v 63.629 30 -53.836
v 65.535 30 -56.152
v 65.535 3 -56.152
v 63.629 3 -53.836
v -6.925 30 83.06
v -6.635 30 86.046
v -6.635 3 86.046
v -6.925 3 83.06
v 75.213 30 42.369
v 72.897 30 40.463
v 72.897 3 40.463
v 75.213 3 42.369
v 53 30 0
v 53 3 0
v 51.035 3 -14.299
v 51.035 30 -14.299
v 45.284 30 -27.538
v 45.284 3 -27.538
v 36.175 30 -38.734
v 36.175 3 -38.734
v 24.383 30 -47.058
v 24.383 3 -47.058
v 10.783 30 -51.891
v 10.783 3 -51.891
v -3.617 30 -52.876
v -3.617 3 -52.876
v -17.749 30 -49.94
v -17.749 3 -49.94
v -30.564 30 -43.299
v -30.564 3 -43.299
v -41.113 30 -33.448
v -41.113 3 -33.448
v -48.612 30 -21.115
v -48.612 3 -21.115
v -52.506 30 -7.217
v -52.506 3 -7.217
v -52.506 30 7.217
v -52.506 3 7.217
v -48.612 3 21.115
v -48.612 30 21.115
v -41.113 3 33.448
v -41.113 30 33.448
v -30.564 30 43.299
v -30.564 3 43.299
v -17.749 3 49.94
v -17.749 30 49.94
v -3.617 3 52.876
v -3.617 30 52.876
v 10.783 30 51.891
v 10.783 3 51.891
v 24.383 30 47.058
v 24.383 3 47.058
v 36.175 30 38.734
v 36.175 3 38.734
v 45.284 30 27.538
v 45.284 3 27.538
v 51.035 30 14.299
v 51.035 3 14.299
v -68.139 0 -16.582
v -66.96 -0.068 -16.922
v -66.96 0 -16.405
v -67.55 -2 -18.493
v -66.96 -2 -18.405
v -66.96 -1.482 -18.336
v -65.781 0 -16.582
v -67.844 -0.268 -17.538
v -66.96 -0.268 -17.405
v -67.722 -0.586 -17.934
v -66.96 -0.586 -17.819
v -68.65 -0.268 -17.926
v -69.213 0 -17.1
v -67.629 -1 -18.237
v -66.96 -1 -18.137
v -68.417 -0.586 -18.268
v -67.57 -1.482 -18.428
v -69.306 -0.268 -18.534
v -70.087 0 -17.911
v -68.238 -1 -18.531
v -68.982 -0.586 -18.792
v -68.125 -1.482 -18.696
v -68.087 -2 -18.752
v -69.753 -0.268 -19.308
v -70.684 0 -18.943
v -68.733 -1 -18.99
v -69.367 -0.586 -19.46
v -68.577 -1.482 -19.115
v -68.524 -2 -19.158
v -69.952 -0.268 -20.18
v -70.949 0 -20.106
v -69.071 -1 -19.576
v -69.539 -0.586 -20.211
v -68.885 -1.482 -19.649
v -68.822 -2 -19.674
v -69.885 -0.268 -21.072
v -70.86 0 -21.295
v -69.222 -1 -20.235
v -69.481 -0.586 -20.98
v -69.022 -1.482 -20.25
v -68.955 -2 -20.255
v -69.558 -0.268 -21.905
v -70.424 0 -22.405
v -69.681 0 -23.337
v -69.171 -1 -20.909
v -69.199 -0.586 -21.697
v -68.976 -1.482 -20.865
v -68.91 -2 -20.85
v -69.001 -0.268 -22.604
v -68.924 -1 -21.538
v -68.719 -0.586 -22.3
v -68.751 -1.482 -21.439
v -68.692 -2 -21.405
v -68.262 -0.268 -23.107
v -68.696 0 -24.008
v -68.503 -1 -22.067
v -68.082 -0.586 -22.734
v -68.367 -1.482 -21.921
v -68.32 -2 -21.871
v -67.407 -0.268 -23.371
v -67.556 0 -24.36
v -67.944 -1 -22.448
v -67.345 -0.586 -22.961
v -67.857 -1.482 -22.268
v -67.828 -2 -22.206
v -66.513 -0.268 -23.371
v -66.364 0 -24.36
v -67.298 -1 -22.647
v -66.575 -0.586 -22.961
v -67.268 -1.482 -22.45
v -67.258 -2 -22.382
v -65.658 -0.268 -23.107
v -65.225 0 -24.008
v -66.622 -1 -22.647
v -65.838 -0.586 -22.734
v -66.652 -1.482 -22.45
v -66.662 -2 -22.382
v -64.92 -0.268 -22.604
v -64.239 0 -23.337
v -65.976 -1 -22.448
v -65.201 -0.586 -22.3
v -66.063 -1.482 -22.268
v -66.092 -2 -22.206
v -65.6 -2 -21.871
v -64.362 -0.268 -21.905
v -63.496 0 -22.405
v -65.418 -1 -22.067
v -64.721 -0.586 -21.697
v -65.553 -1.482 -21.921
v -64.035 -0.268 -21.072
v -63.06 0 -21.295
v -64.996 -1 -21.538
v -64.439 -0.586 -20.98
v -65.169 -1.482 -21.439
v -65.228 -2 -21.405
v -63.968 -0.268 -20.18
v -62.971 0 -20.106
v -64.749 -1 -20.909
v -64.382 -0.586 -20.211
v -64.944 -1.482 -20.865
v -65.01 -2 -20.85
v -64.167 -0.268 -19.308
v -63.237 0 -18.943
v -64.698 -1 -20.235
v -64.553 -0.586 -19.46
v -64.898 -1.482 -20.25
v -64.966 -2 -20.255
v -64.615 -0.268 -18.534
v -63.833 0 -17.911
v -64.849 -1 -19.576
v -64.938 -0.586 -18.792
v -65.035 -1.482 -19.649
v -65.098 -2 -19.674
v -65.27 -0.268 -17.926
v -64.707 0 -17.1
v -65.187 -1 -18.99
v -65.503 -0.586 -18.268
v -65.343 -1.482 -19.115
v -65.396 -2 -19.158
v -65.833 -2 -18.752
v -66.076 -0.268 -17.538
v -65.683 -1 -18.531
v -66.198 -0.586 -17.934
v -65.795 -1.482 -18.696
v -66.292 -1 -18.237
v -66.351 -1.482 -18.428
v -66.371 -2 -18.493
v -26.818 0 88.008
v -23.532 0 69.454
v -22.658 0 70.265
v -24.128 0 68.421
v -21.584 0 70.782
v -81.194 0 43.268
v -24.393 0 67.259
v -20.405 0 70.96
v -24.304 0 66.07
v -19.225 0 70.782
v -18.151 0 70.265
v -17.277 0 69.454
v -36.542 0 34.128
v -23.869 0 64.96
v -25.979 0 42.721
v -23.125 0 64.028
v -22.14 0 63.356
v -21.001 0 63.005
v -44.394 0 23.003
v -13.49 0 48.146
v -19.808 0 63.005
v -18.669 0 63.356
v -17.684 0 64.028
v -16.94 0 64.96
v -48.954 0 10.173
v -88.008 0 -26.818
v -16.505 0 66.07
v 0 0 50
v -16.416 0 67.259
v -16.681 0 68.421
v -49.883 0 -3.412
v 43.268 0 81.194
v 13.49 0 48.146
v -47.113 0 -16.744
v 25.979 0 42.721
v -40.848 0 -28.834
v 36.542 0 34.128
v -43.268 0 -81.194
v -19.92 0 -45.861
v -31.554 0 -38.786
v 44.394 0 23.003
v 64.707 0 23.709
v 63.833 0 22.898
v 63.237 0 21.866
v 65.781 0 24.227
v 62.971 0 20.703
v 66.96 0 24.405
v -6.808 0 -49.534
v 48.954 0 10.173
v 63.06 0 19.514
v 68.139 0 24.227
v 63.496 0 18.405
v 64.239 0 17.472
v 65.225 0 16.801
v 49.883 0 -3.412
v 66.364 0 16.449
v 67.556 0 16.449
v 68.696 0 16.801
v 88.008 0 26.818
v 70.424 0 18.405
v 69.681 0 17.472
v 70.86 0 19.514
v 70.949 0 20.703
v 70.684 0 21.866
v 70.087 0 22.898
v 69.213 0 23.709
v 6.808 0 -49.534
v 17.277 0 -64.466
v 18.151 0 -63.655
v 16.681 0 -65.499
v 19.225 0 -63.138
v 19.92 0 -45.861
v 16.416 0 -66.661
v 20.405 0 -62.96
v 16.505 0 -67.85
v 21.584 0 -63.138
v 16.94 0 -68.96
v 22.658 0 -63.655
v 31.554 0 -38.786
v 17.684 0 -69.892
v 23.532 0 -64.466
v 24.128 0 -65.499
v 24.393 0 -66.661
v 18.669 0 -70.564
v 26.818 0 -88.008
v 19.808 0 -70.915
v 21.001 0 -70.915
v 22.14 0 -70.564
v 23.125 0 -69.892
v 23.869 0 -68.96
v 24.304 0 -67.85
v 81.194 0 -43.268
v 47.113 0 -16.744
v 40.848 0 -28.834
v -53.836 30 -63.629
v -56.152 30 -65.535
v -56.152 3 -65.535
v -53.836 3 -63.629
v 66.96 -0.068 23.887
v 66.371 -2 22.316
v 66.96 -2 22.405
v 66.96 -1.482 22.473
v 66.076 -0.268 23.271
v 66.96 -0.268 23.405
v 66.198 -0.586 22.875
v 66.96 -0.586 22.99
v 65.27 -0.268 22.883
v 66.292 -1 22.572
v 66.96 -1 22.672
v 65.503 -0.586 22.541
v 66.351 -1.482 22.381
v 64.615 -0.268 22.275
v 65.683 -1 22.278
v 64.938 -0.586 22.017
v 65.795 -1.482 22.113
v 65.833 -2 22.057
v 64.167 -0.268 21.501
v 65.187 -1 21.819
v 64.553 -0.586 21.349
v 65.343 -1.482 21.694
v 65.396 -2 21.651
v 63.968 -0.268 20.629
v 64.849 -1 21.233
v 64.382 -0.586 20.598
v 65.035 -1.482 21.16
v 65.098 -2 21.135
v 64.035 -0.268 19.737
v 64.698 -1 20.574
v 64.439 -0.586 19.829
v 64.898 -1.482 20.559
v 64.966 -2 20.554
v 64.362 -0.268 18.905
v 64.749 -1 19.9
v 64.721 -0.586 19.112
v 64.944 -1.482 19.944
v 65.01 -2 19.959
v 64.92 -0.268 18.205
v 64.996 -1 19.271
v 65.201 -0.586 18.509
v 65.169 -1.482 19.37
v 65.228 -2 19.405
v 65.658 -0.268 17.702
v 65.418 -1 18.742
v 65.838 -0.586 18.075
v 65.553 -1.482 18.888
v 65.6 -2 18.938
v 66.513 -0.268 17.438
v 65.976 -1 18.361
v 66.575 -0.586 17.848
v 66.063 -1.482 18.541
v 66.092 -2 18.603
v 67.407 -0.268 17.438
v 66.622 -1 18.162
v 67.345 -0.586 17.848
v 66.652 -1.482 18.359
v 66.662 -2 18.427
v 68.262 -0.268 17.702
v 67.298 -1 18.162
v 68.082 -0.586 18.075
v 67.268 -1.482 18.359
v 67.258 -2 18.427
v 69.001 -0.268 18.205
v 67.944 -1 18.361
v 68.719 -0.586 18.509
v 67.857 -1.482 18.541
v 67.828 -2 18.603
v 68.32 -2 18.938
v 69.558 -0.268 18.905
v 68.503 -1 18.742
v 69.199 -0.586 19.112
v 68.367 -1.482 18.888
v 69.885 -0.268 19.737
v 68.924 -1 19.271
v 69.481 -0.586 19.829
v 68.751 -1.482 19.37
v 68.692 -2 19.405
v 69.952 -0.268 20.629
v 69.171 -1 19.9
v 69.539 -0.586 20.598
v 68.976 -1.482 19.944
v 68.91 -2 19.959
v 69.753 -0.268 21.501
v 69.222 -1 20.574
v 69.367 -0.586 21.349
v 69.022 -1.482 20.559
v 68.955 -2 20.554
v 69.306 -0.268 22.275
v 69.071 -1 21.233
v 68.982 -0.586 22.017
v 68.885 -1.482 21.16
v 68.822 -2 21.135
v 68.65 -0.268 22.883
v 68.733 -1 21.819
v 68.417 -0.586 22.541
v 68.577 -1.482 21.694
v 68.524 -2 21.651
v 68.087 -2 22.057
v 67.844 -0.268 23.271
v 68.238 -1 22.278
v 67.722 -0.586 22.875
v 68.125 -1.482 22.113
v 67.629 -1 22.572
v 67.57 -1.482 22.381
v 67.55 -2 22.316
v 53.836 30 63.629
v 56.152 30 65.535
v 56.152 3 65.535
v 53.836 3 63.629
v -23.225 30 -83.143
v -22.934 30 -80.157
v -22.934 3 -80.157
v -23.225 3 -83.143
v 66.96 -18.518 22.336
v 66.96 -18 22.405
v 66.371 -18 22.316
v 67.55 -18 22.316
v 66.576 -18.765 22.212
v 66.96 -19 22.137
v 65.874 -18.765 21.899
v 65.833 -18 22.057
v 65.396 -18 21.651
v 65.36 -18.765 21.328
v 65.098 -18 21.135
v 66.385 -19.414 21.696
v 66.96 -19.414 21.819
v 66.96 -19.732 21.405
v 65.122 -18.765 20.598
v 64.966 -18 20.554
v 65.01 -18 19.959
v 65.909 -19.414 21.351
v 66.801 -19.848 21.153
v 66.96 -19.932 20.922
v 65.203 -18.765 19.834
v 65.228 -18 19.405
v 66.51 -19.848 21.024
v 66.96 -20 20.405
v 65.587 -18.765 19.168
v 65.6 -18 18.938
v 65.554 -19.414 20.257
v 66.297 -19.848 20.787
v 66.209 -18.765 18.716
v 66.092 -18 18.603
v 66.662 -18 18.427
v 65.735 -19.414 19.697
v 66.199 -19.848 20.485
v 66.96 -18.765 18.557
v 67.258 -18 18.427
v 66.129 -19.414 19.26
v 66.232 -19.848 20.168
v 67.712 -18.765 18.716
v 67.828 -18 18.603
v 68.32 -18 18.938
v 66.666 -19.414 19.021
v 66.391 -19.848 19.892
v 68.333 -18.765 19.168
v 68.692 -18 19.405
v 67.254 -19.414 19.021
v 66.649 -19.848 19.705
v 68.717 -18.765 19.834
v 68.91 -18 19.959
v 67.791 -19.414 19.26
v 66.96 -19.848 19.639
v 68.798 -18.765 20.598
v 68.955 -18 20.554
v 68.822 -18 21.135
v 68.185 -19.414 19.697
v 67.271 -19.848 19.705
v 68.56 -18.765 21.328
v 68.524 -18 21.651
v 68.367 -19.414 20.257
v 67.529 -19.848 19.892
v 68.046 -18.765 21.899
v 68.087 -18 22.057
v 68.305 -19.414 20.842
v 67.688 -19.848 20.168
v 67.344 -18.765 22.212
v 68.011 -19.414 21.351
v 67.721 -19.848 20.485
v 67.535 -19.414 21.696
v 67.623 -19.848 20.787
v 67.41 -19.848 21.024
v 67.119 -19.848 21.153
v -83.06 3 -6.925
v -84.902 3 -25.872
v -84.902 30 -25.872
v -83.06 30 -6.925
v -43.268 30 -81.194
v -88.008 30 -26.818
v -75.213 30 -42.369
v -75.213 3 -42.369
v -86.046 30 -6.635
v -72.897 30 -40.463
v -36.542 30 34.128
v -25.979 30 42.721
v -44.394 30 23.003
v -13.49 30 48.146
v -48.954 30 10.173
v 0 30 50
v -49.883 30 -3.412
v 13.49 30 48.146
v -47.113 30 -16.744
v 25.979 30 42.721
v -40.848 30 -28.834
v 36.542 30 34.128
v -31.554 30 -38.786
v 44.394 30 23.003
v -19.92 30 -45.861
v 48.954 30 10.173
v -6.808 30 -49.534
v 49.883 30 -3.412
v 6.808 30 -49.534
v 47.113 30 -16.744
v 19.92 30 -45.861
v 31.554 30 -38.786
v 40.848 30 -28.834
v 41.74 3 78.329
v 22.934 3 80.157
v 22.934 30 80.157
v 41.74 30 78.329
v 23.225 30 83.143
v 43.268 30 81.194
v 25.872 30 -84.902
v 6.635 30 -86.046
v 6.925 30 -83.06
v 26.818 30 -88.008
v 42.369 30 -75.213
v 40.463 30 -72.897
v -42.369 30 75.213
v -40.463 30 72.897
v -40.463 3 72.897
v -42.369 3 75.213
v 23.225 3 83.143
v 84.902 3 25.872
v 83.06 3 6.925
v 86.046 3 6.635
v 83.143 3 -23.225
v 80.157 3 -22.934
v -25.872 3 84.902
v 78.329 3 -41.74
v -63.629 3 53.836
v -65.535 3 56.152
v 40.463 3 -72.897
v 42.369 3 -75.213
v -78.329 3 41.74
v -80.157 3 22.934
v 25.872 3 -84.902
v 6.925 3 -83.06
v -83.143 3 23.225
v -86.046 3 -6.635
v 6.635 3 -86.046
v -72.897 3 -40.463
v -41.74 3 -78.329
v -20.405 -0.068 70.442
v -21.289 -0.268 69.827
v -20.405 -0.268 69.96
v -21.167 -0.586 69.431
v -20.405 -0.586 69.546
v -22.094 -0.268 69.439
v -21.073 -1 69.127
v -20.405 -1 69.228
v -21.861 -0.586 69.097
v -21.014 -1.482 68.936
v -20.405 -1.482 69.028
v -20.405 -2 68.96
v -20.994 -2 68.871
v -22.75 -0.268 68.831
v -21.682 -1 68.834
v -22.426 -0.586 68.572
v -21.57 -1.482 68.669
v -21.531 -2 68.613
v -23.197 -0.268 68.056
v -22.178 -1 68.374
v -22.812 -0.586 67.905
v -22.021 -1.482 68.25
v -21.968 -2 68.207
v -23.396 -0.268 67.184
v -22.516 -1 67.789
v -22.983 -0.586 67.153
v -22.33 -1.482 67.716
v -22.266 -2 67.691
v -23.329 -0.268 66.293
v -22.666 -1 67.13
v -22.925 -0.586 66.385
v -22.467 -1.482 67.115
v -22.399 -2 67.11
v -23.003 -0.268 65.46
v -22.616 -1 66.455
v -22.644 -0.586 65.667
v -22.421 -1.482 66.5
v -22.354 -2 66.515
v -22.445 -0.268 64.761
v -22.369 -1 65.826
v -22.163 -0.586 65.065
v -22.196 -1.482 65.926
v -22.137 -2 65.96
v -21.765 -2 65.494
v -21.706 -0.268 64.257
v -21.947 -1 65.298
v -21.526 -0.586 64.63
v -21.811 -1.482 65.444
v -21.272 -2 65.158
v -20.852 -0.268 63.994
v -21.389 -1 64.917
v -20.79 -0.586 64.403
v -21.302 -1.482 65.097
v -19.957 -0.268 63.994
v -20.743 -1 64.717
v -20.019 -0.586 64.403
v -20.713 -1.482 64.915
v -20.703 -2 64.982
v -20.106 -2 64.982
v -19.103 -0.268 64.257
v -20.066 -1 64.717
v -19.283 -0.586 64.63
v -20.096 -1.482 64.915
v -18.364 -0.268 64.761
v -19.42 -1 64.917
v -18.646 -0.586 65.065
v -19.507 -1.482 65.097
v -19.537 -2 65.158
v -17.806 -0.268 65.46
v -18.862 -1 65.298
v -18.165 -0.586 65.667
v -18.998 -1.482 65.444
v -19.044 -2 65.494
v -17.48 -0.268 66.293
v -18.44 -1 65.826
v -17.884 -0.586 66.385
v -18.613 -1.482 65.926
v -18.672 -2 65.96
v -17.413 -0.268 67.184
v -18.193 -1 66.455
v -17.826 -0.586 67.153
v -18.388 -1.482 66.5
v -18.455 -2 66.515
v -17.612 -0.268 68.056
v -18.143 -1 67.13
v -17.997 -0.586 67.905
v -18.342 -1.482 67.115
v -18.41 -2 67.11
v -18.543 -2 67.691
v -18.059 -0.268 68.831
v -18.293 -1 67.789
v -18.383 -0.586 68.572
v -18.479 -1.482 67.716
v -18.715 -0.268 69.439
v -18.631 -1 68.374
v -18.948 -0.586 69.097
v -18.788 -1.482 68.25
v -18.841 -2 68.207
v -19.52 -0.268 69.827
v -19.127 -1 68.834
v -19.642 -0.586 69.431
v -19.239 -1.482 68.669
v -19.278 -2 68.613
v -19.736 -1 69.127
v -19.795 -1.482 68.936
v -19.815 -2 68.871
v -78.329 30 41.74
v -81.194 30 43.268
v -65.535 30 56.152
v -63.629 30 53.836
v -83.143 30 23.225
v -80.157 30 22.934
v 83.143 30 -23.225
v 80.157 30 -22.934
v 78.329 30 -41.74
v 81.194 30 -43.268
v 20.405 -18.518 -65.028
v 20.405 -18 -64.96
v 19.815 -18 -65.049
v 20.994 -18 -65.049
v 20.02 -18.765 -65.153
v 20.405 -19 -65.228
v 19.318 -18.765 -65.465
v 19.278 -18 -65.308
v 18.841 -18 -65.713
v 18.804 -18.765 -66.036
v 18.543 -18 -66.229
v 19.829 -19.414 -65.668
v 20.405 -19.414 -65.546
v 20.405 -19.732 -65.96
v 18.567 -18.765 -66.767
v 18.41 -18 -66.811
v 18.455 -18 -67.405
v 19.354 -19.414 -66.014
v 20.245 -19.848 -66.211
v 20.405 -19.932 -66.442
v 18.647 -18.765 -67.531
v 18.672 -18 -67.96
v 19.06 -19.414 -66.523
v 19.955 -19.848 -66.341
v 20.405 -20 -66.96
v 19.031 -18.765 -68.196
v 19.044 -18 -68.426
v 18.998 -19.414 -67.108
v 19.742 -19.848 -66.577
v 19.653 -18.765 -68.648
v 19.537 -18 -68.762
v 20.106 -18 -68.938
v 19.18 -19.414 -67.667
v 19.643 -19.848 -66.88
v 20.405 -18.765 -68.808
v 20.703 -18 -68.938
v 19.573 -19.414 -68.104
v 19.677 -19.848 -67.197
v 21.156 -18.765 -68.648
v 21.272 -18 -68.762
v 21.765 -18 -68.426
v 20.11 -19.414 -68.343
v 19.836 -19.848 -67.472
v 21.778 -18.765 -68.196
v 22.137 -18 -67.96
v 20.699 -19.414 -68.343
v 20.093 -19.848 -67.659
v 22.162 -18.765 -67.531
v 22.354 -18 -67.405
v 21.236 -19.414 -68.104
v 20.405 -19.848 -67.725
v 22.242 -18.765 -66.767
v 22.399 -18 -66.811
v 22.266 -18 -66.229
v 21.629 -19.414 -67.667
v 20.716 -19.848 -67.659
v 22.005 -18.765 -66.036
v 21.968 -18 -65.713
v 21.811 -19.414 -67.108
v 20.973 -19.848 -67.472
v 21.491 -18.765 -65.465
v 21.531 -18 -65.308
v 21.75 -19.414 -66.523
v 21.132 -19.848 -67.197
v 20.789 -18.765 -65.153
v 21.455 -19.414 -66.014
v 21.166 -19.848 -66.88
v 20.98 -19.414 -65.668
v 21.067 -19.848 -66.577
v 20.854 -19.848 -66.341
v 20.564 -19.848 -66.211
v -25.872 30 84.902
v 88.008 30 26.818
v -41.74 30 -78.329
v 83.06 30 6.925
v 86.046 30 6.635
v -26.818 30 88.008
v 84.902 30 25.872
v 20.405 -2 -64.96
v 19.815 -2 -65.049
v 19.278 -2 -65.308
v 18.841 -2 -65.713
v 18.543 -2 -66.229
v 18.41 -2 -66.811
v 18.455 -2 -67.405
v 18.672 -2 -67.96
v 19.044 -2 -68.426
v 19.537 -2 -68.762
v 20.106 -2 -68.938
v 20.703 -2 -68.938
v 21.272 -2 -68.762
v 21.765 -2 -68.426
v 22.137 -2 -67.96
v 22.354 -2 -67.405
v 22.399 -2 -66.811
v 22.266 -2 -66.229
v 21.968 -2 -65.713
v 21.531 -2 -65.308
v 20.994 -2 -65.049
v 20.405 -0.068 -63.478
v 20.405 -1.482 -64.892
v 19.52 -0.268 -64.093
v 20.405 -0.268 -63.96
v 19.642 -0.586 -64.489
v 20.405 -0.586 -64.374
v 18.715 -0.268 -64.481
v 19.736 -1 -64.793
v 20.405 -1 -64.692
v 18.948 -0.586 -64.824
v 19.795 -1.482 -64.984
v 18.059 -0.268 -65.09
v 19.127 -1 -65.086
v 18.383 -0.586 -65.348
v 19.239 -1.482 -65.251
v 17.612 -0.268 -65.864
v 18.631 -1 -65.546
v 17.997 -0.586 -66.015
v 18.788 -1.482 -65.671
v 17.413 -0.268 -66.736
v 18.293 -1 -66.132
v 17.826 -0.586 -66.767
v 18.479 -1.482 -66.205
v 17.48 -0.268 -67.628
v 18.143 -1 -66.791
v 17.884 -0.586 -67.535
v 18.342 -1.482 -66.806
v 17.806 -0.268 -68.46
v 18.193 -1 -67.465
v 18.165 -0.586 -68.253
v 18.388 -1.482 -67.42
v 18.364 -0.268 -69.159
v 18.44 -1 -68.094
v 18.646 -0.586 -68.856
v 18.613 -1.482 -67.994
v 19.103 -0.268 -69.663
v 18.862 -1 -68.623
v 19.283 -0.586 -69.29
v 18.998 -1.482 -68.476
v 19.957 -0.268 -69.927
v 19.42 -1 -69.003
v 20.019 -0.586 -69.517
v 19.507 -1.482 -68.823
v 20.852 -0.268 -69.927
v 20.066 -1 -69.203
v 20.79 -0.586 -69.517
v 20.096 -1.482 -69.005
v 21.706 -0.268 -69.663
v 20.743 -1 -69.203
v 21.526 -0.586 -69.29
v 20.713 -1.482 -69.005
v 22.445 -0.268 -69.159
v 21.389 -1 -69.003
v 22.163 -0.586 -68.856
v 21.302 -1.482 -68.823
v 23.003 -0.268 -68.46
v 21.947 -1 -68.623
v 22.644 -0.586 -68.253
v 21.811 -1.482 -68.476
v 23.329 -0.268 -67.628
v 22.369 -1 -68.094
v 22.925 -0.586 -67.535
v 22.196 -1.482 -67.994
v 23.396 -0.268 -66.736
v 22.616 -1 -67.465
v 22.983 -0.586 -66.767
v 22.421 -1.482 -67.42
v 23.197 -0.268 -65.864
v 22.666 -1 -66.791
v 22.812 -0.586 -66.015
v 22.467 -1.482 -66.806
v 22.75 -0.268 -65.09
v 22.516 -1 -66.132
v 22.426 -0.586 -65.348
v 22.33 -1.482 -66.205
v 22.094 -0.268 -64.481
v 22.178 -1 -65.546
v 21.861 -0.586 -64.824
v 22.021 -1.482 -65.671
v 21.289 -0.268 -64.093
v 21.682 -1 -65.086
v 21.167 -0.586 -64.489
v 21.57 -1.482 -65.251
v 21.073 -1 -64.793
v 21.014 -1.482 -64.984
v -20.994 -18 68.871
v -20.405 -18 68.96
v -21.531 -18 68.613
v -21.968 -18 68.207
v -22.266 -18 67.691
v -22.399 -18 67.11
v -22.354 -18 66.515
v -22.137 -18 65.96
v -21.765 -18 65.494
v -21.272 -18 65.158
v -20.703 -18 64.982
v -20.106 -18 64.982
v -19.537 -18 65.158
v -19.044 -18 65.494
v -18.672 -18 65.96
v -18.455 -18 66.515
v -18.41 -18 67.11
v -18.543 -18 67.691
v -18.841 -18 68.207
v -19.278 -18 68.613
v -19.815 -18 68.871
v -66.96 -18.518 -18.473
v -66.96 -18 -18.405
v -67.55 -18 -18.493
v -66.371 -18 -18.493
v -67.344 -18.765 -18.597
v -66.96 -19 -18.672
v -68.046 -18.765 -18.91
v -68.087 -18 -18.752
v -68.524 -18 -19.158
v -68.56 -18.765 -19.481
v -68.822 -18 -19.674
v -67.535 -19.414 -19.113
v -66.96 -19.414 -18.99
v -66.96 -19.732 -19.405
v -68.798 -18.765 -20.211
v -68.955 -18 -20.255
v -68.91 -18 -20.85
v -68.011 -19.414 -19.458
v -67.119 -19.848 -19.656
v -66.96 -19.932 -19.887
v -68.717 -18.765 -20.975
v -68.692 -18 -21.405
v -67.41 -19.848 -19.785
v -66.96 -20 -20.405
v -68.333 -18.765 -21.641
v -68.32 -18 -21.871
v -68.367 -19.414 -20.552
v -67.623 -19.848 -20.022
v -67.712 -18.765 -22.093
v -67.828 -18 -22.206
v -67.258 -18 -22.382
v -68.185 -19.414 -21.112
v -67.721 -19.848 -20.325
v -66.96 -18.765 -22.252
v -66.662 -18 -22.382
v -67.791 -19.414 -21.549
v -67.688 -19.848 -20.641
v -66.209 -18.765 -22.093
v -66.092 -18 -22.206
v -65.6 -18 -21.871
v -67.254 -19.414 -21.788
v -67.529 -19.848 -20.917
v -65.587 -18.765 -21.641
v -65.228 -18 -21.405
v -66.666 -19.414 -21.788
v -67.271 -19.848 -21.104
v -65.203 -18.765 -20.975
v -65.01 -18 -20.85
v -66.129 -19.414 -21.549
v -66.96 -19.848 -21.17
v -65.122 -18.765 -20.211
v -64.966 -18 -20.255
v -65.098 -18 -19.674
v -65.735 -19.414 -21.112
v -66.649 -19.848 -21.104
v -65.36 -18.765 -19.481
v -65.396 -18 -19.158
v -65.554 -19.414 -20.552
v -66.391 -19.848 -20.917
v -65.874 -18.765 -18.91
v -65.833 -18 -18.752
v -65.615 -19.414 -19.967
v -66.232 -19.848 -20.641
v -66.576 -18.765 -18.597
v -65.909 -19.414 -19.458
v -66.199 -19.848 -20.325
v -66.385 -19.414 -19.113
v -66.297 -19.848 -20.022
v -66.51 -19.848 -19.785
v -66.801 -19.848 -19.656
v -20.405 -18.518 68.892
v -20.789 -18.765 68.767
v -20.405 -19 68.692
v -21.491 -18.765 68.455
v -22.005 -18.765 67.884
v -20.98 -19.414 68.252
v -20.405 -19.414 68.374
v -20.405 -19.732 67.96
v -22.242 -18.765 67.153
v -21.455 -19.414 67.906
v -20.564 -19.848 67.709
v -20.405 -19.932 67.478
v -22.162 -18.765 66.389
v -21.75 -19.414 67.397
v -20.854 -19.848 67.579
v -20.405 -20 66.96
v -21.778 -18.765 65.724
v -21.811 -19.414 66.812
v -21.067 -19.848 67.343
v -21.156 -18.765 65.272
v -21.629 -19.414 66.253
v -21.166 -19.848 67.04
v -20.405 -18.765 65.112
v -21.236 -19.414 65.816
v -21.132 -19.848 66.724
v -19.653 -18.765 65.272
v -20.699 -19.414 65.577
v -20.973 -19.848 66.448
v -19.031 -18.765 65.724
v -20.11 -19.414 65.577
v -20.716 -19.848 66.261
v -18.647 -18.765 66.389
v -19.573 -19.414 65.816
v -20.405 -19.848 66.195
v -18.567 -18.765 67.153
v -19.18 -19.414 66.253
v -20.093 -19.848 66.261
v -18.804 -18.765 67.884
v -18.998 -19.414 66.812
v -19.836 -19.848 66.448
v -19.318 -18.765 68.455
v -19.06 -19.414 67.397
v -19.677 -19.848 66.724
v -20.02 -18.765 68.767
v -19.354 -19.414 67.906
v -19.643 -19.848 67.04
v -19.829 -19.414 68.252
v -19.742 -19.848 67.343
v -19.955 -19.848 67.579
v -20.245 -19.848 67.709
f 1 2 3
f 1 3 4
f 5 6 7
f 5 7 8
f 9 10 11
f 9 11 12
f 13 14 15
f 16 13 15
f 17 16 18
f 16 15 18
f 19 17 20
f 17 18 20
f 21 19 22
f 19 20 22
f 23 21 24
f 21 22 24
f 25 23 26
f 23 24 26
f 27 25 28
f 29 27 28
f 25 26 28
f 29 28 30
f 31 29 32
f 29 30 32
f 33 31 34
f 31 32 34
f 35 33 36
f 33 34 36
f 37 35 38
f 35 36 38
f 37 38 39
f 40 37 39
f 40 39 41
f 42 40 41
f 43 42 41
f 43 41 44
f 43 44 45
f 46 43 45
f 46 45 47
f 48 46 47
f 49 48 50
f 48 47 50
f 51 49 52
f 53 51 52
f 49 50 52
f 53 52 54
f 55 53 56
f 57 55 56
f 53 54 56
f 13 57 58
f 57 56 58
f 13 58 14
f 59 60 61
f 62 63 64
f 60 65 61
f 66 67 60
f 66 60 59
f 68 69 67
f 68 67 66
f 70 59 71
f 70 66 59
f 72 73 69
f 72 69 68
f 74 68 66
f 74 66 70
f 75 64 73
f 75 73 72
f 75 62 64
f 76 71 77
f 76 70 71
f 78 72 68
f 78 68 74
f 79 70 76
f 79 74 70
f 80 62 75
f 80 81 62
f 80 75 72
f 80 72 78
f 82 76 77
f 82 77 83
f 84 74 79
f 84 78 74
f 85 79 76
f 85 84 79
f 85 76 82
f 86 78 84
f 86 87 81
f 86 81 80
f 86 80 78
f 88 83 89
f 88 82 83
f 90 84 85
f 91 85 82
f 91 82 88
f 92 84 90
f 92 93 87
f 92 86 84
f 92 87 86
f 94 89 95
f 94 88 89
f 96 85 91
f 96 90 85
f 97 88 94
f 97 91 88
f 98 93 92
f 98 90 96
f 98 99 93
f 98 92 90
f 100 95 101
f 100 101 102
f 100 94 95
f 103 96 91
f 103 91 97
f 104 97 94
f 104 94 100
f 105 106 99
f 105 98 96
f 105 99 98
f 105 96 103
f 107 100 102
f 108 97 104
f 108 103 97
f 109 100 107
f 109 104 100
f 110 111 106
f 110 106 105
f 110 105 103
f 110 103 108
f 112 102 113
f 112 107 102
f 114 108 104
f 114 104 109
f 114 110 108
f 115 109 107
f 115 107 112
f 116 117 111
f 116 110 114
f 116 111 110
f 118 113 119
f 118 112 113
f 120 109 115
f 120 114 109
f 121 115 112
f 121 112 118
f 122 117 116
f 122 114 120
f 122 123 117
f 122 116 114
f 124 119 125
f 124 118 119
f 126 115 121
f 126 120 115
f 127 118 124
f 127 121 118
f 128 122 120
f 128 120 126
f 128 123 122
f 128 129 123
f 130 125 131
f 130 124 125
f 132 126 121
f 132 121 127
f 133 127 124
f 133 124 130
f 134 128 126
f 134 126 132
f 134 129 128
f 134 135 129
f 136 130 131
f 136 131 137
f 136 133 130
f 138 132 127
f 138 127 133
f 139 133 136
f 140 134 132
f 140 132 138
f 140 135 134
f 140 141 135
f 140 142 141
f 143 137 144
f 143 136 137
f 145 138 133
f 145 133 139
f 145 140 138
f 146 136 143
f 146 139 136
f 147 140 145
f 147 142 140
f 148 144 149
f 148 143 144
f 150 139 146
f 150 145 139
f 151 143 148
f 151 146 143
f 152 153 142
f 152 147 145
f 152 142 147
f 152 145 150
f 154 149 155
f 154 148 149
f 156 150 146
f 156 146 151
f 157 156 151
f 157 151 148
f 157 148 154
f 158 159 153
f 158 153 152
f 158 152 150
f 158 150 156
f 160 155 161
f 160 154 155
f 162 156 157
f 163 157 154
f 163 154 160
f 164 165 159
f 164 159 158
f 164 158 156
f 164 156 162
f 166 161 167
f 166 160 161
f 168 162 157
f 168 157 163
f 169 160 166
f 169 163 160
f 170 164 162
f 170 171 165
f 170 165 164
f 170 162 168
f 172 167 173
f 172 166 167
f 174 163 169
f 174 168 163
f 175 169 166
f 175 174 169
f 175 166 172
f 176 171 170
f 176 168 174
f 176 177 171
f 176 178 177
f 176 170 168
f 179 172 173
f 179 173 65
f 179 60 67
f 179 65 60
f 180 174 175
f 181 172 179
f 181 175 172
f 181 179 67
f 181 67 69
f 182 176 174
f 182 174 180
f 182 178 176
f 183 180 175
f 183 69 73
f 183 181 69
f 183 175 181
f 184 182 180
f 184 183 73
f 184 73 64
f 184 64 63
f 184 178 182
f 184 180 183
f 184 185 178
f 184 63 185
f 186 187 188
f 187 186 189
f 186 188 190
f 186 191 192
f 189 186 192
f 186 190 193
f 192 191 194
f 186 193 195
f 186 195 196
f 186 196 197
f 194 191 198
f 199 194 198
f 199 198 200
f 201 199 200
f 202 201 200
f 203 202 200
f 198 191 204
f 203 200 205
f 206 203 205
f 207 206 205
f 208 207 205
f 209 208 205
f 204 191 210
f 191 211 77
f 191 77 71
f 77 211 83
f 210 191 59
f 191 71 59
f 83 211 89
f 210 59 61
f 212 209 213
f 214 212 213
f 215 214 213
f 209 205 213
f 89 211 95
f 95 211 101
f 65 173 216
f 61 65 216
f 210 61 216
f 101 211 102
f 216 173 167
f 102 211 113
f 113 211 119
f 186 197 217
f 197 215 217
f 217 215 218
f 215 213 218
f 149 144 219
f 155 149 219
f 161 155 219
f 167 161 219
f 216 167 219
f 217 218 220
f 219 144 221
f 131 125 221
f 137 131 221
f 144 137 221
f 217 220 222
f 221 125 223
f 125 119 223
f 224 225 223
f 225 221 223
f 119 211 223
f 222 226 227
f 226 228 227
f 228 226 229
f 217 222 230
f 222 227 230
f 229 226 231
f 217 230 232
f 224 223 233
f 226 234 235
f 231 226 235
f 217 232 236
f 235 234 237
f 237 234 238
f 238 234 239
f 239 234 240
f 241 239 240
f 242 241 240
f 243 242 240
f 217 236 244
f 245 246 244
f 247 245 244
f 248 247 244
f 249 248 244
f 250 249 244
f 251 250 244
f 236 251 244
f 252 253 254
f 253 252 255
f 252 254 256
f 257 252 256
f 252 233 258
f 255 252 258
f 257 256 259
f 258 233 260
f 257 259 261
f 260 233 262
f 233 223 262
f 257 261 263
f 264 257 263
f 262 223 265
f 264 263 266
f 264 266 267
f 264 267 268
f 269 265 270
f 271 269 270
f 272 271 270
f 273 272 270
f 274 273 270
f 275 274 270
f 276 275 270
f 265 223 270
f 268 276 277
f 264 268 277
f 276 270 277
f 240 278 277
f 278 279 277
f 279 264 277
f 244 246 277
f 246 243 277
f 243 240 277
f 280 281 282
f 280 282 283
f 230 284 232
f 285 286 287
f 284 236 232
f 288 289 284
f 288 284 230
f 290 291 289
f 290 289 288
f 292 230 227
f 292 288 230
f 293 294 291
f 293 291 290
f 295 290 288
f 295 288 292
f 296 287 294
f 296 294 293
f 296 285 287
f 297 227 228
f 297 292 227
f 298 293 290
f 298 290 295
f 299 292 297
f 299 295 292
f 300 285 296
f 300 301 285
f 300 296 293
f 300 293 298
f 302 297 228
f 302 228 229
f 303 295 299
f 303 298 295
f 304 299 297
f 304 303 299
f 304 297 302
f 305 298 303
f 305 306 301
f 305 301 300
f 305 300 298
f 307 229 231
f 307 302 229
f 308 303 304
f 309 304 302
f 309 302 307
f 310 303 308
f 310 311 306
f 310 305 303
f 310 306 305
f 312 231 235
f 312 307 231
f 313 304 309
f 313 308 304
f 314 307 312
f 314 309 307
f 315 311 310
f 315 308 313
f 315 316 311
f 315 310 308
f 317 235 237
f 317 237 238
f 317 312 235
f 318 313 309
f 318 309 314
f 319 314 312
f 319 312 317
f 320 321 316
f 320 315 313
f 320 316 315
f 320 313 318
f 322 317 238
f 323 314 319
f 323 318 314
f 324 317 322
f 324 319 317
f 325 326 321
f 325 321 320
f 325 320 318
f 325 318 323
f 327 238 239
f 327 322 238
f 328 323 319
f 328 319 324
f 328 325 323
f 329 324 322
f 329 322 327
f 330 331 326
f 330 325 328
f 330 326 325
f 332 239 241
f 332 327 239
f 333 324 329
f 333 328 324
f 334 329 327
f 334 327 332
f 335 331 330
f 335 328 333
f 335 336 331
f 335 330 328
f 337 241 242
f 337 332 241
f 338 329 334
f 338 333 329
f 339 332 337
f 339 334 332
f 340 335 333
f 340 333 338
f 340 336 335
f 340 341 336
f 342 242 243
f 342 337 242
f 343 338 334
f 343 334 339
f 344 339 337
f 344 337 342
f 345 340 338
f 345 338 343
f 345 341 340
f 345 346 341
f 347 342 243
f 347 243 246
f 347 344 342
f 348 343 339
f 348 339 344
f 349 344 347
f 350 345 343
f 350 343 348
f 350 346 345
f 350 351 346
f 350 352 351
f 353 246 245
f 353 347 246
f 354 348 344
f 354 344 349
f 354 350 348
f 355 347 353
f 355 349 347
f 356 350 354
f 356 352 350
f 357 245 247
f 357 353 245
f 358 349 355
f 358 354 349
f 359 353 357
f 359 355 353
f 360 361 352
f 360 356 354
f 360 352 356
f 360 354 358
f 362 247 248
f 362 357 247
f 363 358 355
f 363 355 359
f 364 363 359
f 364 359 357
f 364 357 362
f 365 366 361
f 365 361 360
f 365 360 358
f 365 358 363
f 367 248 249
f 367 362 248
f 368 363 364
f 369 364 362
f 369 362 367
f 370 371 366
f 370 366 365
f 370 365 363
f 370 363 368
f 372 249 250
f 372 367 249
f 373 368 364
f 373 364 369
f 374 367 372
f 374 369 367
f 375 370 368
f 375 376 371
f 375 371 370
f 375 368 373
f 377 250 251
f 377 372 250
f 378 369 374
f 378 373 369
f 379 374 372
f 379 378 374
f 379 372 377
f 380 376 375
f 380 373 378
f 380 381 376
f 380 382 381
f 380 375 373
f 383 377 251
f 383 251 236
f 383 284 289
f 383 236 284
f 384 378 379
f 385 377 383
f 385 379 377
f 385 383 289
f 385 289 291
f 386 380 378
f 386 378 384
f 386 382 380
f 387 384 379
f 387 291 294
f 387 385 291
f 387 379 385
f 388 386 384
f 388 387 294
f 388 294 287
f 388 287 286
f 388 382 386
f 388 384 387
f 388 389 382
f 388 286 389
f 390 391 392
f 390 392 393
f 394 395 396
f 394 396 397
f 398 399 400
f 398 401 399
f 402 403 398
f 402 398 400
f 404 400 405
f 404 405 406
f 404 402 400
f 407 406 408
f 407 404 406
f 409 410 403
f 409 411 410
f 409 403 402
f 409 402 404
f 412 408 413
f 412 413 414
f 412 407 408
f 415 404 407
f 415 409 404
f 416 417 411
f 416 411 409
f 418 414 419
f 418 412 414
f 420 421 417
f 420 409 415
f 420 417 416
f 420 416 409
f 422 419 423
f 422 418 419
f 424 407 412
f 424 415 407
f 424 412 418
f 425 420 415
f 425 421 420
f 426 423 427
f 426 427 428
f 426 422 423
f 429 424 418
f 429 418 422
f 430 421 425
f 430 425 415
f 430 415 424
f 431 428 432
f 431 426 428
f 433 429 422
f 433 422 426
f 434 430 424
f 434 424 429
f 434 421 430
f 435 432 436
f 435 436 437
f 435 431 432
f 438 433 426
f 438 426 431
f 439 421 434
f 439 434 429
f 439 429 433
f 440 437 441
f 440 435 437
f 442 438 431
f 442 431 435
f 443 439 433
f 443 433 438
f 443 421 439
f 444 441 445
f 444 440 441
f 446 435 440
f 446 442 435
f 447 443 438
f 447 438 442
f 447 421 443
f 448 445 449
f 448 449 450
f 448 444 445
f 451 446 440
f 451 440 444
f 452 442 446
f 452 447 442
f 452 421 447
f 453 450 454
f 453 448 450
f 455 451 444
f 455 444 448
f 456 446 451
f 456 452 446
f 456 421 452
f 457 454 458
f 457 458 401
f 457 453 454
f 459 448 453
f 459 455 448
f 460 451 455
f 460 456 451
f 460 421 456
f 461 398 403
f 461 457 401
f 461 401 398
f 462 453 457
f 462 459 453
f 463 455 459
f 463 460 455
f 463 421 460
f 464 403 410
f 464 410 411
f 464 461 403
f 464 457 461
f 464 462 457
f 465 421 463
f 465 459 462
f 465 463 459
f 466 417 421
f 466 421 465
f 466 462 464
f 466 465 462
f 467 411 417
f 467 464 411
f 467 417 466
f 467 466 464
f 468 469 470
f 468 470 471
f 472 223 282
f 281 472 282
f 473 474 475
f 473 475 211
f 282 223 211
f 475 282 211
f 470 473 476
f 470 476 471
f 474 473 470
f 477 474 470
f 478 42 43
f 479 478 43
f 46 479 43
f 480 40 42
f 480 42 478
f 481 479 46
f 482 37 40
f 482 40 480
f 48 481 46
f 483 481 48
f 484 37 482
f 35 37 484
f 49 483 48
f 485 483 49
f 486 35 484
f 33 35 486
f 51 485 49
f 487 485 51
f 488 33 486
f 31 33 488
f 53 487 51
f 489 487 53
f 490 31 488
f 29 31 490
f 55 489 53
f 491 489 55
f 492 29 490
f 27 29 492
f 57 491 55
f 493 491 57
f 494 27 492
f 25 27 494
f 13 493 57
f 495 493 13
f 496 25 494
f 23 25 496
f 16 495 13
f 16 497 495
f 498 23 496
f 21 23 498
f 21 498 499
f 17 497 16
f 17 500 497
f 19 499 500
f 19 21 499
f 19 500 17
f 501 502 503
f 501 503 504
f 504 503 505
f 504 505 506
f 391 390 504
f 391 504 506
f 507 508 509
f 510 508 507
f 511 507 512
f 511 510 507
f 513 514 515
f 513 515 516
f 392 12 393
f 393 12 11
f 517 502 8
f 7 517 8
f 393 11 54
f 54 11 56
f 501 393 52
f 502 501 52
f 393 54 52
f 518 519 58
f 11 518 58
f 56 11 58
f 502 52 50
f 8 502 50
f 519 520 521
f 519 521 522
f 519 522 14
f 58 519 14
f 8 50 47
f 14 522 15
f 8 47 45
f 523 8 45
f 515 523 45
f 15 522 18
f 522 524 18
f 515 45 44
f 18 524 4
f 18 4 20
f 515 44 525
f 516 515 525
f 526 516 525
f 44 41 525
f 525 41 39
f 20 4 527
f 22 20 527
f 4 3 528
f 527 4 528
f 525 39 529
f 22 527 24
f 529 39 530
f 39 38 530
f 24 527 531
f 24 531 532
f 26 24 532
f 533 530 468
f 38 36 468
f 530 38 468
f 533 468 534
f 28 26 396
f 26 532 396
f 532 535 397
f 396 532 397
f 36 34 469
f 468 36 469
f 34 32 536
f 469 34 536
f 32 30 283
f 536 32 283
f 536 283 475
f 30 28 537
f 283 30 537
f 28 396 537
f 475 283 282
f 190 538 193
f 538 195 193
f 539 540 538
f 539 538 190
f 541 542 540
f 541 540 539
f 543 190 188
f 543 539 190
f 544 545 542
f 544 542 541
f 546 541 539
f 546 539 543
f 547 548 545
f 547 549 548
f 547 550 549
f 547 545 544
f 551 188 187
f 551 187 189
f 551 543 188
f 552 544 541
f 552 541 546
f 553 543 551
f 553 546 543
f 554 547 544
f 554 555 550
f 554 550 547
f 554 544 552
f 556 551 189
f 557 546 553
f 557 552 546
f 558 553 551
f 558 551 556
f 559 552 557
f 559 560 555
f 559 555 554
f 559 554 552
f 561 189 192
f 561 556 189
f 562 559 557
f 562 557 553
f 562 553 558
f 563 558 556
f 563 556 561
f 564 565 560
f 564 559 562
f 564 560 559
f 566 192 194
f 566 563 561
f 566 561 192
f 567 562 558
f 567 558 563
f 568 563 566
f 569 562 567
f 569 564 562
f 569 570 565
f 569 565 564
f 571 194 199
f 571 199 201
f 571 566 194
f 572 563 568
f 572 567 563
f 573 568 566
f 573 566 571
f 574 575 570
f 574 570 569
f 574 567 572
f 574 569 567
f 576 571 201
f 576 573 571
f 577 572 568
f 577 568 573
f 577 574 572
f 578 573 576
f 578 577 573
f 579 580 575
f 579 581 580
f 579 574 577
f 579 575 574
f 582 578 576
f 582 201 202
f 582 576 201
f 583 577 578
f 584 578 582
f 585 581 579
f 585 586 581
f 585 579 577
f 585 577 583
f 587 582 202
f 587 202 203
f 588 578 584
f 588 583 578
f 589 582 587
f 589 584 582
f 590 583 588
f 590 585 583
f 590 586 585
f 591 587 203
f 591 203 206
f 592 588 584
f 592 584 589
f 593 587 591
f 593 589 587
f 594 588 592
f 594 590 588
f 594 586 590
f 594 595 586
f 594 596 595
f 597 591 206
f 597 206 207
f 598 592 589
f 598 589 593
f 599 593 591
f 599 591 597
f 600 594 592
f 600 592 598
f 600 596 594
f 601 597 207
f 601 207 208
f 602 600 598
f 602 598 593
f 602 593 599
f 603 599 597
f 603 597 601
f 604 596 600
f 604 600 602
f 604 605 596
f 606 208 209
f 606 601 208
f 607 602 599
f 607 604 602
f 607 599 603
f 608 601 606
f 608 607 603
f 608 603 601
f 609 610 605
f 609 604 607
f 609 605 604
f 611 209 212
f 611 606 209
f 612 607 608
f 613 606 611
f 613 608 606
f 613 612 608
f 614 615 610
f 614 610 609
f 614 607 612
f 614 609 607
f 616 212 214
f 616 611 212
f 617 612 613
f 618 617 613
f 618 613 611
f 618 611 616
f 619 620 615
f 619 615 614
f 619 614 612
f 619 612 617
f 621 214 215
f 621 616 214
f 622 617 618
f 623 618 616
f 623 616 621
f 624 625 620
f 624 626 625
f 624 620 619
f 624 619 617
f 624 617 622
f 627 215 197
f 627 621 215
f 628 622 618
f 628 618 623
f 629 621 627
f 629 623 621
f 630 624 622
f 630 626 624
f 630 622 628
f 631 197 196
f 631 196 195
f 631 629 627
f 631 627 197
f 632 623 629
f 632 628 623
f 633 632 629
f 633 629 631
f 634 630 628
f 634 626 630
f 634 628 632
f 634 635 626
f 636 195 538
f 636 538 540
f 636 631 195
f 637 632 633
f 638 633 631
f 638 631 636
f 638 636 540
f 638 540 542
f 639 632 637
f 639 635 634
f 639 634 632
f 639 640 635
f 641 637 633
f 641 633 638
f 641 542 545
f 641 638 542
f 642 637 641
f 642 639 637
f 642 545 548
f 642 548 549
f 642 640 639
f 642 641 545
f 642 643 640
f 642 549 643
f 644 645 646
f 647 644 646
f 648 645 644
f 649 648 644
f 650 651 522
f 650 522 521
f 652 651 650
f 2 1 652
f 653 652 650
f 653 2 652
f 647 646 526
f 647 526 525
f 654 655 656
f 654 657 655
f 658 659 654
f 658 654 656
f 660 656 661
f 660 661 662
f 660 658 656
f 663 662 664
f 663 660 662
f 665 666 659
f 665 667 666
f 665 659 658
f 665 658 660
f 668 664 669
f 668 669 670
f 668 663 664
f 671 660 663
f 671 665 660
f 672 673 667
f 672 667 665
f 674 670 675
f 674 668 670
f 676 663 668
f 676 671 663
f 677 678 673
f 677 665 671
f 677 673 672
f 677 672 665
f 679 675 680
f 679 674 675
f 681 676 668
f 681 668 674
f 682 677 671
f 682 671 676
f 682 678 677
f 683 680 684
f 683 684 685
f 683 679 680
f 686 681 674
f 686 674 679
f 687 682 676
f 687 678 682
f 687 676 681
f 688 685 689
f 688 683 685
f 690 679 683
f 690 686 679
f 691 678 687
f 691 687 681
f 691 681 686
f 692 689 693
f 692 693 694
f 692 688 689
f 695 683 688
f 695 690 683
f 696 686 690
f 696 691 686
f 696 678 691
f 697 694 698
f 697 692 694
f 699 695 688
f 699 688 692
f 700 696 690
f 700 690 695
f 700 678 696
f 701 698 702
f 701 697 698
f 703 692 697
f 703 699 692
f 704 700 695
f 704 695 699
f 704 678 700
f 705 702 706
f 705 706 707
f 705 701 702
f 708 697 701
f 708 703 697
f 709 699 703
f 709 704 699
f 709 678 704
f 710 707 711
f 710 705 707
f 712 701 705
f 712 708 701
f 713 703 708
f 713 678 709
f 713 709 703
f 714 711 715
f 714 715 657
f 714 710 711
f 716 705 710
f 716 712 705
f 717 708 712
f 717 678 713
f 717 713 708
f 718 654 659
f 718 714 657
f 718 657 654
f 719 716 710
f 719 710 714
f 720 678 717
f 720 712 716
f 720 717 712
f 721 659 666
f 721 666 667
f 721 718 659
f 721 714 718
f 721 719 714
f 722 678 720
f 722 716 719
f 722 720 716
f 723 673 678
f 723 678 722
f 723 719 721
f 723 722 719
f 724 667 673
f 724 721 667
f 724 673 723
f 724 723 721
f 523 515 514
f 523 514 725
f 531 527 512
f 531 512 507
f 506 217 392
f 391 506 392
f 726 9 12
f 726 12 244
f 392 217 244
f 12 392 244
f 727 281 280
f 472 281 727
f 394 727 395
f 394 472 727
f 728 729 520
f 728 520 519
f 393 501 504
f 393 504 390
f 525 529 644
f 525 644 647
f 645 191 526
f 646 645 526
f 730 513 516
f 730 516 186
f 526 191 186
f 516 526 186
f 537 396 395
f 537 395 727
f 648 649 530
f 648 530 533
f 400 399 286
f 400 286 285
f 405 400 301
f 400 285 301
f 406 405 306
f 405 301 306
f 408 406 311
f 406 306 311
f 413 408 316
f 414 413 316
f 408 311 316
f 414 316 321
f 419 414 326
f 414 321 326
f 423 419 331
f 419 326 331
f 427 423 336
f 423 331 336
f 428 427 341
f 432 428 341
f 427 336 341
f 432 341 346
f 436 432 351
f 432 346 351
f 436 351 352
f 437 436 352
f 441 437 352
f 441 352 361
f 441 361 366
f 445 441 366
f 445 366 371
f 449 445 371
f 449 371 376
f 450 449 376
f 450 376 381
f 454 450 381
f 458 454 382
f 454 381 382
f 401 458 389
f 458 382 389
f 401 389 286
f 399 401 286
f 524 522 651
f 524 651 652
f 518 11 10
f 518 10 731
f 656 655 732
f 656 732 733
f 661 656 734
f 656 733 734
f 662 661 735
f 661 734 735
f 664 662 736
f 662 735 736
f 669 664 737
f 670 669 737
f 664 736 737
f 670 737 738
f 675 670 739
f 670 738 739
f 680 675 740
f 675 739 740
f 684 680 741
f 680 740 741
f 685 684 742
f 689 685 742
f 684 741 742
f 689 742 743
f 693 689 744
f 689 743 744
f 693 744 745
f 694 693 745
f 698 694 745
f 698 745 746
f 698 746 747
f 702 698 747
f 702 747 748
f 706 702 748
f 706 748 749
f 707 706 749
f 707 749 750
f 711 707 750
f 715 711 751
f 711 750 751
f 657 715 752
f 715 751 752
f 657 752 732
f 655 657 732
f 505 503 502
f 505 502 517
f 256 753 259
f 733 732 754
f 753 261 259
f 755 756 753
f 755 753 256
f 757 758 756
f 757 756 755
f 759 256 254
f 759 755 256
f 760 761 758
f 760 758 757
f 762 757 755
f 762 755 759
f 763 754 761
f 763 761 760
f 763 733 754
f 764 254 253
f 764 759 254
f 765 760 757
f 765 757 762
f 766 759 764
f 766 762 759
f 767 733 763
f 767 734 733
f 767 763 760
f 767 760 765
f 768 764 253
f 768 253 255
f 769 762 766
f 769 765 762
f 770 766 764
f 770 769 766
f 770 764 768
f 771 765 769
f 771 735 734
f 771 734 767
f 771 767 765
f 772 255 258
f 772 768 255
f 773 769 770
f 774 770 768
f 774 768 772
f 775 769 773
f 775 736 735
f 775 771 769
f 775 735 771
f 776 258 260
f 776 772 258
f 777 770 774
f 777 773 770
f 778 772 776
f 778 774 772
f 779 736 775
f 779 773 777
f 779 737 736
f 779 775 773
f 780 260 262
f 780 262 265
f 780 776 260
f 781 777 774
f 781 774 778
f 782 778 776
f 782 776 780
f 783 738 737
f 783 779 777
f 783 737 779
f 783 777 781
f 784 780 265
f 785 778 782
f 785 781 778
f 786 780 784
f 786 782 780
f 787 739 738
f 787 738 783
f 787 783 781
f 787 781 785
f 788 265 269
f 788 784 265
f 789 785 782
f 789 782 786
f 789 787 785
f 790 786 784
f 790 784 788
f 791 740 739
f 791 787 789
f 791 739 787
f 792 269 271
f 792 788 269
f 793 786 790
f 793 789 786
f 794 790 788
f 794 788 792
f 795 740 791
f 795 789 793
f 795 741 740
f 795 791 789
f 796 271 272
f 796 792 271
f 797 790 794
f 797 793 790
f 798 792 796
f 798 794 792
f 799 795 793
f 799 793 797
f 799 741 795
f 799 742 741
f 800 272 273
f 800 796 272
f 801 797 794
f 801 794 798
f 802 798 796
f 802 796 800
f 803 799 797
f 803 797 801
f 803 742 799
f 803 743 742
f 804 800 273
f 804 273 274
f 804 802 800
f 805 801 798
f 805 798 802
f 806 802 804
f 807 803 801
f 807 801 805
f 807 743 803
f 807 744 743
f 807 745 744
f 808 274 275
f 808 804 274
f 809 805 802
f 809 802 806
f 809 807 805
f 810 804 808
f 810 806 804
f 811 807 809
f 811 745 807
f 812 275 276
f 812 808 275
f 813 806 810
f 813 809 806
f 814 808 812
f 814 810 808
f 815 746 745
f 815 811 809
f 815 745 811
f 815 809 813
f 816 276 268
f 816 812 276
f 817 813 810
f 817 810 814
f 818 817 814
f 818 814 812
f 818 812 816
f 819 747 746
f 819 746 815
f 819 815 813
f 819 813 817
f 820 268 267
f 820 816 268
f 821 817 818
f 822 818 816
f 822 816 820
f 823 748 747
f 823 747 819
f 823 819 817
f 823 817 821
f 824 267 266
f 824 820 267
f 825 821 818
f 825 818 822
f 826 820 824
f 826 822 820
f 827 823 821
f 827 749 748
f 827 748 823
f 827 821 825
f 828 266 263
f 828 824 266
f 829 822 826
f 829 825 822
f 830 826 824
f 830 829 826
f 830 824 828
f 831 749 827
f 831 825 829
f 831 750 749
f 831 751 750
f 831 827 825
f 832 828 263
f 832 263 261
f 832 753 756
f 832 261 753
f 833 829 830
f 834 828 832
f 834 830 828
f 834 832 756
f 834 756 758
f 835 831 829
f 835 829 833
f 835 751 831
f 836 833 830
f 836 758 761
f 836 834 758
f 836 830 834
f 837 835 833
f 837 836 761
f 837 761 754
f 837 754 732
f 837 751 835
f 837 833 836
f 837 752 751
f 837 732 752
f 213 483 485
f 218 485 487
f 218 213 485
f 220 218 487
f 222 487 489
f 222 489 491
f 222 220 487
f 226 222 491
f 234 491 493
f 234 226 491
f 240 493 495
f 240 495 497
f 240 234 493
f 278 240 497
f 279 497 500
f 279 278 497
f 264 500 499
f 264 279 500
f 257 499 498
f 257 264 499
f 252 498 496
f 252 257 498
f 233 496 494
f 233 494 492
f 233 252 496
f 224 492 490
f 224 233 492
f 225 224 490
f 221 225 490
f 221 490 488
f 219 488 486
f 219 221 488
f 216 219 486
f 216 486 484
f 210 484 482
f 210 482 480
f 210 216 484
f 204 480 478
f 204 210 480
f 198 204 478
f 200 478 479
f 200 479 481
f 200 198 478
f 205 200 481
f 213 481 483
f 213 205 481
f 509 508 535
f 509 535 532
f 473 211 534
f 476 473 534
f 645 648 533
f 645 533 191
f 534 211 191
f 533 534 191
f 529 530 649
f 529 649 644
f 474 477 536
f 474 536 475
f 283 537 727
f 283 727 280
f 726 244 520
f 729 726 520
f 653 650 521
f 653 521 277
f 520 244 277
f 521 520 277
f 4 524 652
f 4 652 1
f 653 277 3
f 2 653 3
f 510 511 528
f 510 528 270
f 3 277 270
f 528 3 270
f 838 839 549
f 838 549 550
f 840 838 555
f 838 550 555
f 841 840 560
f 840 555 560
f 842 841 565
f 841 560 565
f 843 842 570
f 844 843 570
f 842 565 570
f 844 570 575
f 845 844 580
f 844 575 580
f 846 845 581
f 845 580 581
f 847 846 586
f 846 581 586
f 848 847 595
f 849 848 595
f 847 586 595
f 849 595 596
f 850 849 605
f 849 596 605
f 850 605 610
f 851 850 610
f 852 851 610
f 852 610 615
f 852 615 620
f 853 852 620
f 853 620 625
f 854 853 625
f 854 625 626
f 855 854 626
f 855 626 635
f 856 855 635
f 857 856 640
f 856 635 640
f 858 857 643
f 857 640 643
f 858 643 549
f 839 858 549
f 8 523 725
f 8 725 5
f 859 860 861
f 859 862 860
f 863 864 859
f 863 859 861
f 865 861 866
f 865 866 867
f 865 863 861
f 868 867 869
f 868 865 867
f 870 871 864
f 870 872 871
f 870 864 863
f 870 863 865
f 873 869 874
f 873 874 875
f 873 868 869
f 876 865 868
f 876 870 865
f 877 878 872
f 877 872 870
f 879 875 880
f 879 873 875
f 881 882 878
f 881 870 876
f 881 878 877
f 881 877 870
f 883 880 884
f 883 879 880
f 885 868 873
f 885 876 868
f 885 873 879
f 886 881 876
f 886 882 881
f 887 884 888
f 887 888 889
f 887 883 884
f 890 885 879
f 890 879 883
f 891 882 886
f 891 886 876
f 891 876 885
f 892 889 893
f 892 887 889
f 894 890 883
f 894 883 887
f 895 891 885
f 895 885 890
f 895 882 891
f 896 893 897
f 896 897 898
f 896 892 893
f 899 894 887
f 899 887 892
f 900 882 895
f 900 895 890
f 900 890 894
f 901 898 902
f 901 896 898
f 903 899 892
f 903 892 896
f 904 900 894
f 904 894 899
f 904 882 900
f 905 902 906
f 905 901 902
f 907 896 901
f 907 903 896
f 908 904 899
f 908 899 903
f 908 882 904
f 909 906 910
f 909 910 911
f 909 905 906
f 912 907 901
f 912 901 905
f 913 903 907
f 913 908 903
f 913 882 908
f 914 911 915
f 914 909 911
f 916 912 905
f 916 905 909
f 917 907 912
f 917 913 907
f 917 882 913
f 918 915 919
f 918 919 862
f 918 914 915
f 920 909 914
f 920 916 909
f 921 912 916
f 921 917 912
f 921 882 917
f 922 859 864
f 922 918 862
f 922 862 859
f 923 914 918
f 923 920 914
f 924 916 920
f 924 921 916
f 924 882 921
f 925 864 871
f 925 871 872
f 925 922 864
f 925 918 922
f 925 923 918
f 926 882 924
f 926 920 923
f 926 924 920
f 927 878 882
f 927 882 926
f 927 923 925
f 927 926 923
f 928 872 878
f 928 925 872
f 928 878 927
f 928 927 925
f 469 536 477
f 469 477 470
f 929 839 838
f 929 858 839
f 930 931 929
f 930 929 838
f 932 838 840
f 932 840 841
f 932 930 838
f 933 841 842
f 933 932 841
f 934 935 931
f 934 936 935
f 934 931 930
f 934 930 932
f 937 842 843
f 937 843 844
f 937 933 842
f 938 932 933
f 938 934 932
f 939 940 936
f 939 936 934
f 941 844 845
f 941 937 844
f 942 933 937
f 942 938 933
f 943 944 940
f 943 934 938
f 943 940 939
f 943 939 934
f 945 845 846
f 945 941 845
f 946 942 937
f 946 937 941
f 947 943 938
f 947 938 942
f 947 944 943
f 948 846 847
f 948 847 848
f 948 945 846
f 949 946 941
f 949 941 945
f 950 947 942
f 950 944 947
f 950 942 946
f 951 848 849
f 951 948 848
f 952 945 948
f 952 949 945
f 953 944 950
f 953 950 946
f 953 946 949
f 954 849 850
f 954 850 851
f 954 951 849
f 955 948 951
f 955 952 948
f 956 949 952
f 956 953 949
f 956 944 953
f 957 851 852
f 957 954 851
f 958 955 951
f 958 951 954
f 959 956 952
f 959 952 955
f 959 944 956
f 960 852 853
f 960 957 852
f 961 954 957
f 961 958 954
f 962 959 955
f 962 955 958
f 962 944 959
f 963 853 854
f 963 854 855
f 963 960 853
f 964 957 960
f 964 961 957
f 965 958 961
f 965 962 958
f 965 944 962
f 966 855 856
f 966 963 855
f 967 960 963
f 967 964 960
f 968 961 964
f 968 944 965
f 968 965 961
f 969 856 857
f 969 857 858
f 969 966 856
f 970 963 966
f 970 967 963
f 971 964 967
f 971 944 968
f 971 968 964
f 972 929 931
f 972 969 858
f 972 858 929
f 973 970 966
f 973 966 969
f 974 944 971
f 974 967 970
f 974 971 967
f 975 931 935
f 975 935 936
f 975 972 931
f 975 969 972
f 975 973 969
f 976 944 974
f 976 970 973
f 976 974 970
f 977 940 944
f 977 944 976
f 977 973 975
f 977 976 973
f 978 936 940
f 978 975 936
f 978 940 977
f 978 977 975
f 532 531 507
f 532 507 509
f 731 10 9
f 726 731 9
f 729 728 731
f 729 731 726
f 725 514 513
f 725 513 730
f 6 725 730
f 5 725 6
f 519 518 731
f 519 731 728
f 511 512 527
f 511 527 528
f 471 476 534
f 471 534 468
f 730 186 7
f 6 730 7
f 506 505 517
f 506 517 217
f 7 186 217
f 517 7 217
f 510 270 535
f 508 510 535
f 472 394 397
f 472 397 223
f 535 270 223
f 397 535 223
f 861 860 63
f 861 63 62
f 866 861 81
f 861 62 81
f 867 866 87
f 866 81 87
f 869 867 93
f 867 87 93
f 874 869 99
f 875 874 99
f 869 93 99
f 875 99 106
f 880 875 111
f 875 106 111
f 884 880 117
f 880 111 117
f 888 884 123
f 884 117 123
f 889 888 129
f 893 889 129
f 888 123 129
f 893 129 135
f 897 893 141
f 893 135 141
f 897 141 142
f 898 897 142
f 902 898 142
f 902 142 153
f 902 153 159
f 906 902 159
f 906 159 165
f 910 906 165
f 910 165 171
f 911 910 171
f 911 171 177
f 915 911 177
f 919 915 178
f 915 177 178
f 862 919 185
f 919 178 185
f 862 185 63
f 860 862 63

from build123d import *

# Parameters (mm, degrees)
SKETCH1_R           = 50
BOSS_EXTRUDE1_DEPTH = 30
SKETCH2_R           = 2
BOSS_EXTRUDE2_DEPTH = 20
FILLET1_R           = 2
SHELL1_START        = 3
SHELL1_OUTLINE_R    = 53
SHELL1_DEPTH        = 27
CUT_EXTRUDE1_DEPTH  = 27


# Read off the part's stored shape, not the designer's step: Shell1
with BuildPart() as part:
    # Sketch1 → Boss-Extrude1 (new body)
    with BuildSketch(Plane(origin=(0, 0, 0), x_dir=(1, 0, 0), z_dir=(0, 1, 0))):
        Polygon((-43.26756368, 81.194408409), (-88.007904464, 26.818329097), (-81.194408409, -43.26756368), (-26.818329097, -88.007904464), (43.26756368, -81.194408409), (88.007904464, -26.818329097), (81.194408409, 43.26756368), (26.818329097, 88.007904464), align=None)
        with Locations(Location((0, 0, 0), (0, 0, 270))):
            Circle(SKETCH1_R, mode=Mode.SUBTRACT)
    extrude(amount=BOSS_EXTRUDE1_DEPTH)

    # Sketch2 → Boss-Extrude2 (add)
    with BuildSketch(Plane(origin=(0, 0, 0), x_dir=(-1, 0, 0), z_dir=(0, -1, 0))):
        with Locations(Location((66.960107228, 20.404510287, 0), (0, 0, 270))):
            Circle(SKETCH2_R)
        with Locations(Location((20.404510287, -66.960107228, 0), (0, 0, 270))):
            Circle(SKETCH2_R)
        with Locations(Location((-66.960107228, -20.404510287, 0), (0, 0, 270))):
            Circle(SKETCH2_R)
        with Locations(Location((-20.404510287, 66.960107228, 0), (0, 0, 270))):
            Circle(SKETCH2_R)
    extrude(amount=BOSS_EXTRUDE2_DEPTH)

    # Fillet1
    fillet1_edges = [part.edges().sort_by_distance(p)[0] for p in [
        (-66.960107228, 0, -22.404510287),
        (-66.960107228, -20, -22.404510287),
        (-20.404510287, 0, 64.960107228),
        (-20.404510287, -20, 64.960107228),
        (66.960107228, 0, 18.404510287),
        (66.960107228, -20, 18.404510287),
        (20.404510287, 0, -68.960107228),
        (20.404510287, -20, -68.960107228),
    ]]
    fillet(fillet1_edges, radius=FILLET1_R)

    # Shell1 outline → Shell1 (cut)
    with BuildSketch(Plane(origin=(0, 0, 0), x_dir=(1, 0, 0), z_dir=(0, 1, 0)).offset(SHELL1_START)):
        Polygon((25.871799834, 84.90174313), (-41.740473197, 78.328723406), (-84.90174313, 25.871799834), (-78.328723406, -41.740473197), (-25.871799834, -84.90174313), (41.740473197, -78.328723406), (84.90174313, -25.871799834), (78.328723406, 41.740473197), align=None)
        Circle(SHELL1_OUTLINE_R, mode=Mode.SUBTRACT)
    extrude(amount=SHELL1_DEPTH, mode=Mode.SUBTRACT)

    # Sketch3 → Cut-Extrude1 (cut)
    with BuildSketch(Plane(origin=(0, 30, 0), x_dir=(1, 0, 0), z_dir=(0, 1, 0))):
        Polygon((6.634614392, 86.045716996), (6.924895002, 83.059793827), (-22.934336682, 80.156987724), (-23.224617292, 83.142910893), align=None)
        Polygon((63.628783674, 53.835503244), (40.46252459, 72.896574569), (42.368631722, 75.213200477), (65.534890807, 56.152129153), align=None)
        Polygon((83.059793827, -6.924895002), (80.156987724, 22.934336682), (83.142910893, 23.224617292), (86.045716996, -6.634614392), align=None)
        Polygon((53.835503244, -63.628783674), (72.896574569, -40.46252459), (75.213200477, -42.368631722), (56.152129153, -65.534890807), align=None)
        Polygon((-6.924895002, -83.059793827), (22.934336682, -80.156987724), (23.224617292, -83.142910893), (-6.634614392, -86.045716996), align=None)
        Polygon((-63.628783674, -53.835503244), (-40.46252459, -72.896574569), (-42.368631722, -75.213200477), (-65.534890807, -56.152129153), align=None)
        Polygon((-83.059793827, 6.924895002), (-80.156987724, -22.934336682), (-83.142910893, -23.224617292), (-86.045716996, 6.634614392), align=None)
        Polygon((-53.835503244, 63.628783674), (-72.896574569, 40.46252459), (-75.213200477, 42.368631722), (-56.152129153, 65.534890807), align=None)
    extrude(amount=-CUT_EXTRUDE1_DEPTH, mode=Mode.SUBTRACT)


solid = part.part
